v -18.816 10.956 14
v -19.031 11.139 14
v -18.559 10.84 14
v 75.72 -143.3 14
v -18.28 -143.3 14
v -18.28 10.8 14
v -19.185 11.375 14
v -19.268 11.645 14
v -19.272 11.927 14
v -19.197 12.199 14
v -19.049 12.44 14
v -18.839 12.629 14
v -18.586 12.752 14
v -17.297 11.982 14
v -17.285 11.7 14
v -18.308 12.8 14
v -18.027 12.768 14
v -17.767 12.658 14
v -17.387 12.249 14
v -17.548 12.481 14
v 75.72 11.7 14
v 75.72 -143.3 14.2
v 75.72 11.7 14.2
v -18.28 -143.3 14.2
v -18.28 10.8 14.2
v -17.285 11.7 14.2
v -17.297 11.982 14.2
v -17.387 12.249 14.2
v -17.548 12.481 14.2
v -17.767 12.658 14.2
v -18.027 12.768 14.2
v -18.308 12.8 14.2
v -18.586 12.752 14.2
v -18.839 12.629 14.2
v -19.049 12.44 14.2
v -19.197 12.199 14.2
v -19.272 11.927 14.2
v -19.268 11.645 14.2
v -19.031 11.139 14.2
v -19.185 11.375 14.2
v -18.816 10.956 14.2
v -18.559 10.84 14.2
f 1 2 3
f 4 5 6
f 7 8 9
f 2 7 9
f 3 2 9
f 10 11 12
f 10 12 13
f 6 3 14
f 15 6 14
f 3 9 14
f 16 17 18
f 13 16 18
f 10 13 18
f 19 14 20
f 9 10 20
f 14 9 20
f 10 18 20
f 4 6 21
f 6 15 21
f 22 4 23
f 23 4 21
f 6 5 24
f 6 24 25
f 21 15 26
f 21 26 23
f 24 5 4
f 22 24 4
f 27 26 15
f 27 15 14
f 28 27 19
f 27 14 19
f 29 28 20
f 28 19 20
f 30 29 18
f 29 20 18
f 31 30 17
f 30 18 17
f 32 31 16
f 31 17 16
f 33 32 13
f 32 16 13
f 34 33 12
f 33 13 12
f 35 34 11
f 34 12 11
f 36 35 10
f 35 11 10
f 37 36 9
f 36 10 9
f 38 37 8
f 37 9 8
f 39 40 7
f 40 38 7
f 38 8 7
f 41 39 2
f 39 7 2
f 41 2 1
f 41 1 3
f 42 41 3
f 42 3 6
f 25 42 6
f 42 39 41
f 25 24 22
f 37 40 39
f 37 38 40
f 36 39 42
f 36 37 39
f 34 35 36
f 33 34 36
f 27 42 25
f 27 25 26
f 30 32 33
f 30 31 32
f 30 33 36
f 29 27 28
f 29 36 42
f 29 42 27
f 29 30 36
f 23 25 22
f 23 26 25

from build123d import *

# Parameters (mm, degrees)
CYLINDER_R     = 1
CYLINDER_DEPTH = 0.2
BOX005_W       = 94
BOX005_H       = 155
BOX005_DEPTH   = 0.2


with BuildPart() as cylinder:
    # Cylinder → Cylinder (new body)
    with BuildSketch(Plane(origin=(-18.28, 11.8, 14), x_dir=(1, 0, 0), z_dir=(0, 0, 1))):
        Circle(CYLINDER_R)
    extrude(amount=CYLINDER_DEPTH)


with BuildPart() as display_frame:
    # Box005 → Box005 (new body)
    with BuildSketch(Plane(origin=(-18.28, -143.3, 14), x_dir=(1, 0, 0), z_dir=(0, 0, 1))):
        with Locations((47, 77.5)):
            Rectangle(BOX005_W, BOX005_H)
    extrude(amount=BOX005_DEPTH)

    # Fusion: union Cylinder
    add(cylinder.part)


solid = display_frame.part
